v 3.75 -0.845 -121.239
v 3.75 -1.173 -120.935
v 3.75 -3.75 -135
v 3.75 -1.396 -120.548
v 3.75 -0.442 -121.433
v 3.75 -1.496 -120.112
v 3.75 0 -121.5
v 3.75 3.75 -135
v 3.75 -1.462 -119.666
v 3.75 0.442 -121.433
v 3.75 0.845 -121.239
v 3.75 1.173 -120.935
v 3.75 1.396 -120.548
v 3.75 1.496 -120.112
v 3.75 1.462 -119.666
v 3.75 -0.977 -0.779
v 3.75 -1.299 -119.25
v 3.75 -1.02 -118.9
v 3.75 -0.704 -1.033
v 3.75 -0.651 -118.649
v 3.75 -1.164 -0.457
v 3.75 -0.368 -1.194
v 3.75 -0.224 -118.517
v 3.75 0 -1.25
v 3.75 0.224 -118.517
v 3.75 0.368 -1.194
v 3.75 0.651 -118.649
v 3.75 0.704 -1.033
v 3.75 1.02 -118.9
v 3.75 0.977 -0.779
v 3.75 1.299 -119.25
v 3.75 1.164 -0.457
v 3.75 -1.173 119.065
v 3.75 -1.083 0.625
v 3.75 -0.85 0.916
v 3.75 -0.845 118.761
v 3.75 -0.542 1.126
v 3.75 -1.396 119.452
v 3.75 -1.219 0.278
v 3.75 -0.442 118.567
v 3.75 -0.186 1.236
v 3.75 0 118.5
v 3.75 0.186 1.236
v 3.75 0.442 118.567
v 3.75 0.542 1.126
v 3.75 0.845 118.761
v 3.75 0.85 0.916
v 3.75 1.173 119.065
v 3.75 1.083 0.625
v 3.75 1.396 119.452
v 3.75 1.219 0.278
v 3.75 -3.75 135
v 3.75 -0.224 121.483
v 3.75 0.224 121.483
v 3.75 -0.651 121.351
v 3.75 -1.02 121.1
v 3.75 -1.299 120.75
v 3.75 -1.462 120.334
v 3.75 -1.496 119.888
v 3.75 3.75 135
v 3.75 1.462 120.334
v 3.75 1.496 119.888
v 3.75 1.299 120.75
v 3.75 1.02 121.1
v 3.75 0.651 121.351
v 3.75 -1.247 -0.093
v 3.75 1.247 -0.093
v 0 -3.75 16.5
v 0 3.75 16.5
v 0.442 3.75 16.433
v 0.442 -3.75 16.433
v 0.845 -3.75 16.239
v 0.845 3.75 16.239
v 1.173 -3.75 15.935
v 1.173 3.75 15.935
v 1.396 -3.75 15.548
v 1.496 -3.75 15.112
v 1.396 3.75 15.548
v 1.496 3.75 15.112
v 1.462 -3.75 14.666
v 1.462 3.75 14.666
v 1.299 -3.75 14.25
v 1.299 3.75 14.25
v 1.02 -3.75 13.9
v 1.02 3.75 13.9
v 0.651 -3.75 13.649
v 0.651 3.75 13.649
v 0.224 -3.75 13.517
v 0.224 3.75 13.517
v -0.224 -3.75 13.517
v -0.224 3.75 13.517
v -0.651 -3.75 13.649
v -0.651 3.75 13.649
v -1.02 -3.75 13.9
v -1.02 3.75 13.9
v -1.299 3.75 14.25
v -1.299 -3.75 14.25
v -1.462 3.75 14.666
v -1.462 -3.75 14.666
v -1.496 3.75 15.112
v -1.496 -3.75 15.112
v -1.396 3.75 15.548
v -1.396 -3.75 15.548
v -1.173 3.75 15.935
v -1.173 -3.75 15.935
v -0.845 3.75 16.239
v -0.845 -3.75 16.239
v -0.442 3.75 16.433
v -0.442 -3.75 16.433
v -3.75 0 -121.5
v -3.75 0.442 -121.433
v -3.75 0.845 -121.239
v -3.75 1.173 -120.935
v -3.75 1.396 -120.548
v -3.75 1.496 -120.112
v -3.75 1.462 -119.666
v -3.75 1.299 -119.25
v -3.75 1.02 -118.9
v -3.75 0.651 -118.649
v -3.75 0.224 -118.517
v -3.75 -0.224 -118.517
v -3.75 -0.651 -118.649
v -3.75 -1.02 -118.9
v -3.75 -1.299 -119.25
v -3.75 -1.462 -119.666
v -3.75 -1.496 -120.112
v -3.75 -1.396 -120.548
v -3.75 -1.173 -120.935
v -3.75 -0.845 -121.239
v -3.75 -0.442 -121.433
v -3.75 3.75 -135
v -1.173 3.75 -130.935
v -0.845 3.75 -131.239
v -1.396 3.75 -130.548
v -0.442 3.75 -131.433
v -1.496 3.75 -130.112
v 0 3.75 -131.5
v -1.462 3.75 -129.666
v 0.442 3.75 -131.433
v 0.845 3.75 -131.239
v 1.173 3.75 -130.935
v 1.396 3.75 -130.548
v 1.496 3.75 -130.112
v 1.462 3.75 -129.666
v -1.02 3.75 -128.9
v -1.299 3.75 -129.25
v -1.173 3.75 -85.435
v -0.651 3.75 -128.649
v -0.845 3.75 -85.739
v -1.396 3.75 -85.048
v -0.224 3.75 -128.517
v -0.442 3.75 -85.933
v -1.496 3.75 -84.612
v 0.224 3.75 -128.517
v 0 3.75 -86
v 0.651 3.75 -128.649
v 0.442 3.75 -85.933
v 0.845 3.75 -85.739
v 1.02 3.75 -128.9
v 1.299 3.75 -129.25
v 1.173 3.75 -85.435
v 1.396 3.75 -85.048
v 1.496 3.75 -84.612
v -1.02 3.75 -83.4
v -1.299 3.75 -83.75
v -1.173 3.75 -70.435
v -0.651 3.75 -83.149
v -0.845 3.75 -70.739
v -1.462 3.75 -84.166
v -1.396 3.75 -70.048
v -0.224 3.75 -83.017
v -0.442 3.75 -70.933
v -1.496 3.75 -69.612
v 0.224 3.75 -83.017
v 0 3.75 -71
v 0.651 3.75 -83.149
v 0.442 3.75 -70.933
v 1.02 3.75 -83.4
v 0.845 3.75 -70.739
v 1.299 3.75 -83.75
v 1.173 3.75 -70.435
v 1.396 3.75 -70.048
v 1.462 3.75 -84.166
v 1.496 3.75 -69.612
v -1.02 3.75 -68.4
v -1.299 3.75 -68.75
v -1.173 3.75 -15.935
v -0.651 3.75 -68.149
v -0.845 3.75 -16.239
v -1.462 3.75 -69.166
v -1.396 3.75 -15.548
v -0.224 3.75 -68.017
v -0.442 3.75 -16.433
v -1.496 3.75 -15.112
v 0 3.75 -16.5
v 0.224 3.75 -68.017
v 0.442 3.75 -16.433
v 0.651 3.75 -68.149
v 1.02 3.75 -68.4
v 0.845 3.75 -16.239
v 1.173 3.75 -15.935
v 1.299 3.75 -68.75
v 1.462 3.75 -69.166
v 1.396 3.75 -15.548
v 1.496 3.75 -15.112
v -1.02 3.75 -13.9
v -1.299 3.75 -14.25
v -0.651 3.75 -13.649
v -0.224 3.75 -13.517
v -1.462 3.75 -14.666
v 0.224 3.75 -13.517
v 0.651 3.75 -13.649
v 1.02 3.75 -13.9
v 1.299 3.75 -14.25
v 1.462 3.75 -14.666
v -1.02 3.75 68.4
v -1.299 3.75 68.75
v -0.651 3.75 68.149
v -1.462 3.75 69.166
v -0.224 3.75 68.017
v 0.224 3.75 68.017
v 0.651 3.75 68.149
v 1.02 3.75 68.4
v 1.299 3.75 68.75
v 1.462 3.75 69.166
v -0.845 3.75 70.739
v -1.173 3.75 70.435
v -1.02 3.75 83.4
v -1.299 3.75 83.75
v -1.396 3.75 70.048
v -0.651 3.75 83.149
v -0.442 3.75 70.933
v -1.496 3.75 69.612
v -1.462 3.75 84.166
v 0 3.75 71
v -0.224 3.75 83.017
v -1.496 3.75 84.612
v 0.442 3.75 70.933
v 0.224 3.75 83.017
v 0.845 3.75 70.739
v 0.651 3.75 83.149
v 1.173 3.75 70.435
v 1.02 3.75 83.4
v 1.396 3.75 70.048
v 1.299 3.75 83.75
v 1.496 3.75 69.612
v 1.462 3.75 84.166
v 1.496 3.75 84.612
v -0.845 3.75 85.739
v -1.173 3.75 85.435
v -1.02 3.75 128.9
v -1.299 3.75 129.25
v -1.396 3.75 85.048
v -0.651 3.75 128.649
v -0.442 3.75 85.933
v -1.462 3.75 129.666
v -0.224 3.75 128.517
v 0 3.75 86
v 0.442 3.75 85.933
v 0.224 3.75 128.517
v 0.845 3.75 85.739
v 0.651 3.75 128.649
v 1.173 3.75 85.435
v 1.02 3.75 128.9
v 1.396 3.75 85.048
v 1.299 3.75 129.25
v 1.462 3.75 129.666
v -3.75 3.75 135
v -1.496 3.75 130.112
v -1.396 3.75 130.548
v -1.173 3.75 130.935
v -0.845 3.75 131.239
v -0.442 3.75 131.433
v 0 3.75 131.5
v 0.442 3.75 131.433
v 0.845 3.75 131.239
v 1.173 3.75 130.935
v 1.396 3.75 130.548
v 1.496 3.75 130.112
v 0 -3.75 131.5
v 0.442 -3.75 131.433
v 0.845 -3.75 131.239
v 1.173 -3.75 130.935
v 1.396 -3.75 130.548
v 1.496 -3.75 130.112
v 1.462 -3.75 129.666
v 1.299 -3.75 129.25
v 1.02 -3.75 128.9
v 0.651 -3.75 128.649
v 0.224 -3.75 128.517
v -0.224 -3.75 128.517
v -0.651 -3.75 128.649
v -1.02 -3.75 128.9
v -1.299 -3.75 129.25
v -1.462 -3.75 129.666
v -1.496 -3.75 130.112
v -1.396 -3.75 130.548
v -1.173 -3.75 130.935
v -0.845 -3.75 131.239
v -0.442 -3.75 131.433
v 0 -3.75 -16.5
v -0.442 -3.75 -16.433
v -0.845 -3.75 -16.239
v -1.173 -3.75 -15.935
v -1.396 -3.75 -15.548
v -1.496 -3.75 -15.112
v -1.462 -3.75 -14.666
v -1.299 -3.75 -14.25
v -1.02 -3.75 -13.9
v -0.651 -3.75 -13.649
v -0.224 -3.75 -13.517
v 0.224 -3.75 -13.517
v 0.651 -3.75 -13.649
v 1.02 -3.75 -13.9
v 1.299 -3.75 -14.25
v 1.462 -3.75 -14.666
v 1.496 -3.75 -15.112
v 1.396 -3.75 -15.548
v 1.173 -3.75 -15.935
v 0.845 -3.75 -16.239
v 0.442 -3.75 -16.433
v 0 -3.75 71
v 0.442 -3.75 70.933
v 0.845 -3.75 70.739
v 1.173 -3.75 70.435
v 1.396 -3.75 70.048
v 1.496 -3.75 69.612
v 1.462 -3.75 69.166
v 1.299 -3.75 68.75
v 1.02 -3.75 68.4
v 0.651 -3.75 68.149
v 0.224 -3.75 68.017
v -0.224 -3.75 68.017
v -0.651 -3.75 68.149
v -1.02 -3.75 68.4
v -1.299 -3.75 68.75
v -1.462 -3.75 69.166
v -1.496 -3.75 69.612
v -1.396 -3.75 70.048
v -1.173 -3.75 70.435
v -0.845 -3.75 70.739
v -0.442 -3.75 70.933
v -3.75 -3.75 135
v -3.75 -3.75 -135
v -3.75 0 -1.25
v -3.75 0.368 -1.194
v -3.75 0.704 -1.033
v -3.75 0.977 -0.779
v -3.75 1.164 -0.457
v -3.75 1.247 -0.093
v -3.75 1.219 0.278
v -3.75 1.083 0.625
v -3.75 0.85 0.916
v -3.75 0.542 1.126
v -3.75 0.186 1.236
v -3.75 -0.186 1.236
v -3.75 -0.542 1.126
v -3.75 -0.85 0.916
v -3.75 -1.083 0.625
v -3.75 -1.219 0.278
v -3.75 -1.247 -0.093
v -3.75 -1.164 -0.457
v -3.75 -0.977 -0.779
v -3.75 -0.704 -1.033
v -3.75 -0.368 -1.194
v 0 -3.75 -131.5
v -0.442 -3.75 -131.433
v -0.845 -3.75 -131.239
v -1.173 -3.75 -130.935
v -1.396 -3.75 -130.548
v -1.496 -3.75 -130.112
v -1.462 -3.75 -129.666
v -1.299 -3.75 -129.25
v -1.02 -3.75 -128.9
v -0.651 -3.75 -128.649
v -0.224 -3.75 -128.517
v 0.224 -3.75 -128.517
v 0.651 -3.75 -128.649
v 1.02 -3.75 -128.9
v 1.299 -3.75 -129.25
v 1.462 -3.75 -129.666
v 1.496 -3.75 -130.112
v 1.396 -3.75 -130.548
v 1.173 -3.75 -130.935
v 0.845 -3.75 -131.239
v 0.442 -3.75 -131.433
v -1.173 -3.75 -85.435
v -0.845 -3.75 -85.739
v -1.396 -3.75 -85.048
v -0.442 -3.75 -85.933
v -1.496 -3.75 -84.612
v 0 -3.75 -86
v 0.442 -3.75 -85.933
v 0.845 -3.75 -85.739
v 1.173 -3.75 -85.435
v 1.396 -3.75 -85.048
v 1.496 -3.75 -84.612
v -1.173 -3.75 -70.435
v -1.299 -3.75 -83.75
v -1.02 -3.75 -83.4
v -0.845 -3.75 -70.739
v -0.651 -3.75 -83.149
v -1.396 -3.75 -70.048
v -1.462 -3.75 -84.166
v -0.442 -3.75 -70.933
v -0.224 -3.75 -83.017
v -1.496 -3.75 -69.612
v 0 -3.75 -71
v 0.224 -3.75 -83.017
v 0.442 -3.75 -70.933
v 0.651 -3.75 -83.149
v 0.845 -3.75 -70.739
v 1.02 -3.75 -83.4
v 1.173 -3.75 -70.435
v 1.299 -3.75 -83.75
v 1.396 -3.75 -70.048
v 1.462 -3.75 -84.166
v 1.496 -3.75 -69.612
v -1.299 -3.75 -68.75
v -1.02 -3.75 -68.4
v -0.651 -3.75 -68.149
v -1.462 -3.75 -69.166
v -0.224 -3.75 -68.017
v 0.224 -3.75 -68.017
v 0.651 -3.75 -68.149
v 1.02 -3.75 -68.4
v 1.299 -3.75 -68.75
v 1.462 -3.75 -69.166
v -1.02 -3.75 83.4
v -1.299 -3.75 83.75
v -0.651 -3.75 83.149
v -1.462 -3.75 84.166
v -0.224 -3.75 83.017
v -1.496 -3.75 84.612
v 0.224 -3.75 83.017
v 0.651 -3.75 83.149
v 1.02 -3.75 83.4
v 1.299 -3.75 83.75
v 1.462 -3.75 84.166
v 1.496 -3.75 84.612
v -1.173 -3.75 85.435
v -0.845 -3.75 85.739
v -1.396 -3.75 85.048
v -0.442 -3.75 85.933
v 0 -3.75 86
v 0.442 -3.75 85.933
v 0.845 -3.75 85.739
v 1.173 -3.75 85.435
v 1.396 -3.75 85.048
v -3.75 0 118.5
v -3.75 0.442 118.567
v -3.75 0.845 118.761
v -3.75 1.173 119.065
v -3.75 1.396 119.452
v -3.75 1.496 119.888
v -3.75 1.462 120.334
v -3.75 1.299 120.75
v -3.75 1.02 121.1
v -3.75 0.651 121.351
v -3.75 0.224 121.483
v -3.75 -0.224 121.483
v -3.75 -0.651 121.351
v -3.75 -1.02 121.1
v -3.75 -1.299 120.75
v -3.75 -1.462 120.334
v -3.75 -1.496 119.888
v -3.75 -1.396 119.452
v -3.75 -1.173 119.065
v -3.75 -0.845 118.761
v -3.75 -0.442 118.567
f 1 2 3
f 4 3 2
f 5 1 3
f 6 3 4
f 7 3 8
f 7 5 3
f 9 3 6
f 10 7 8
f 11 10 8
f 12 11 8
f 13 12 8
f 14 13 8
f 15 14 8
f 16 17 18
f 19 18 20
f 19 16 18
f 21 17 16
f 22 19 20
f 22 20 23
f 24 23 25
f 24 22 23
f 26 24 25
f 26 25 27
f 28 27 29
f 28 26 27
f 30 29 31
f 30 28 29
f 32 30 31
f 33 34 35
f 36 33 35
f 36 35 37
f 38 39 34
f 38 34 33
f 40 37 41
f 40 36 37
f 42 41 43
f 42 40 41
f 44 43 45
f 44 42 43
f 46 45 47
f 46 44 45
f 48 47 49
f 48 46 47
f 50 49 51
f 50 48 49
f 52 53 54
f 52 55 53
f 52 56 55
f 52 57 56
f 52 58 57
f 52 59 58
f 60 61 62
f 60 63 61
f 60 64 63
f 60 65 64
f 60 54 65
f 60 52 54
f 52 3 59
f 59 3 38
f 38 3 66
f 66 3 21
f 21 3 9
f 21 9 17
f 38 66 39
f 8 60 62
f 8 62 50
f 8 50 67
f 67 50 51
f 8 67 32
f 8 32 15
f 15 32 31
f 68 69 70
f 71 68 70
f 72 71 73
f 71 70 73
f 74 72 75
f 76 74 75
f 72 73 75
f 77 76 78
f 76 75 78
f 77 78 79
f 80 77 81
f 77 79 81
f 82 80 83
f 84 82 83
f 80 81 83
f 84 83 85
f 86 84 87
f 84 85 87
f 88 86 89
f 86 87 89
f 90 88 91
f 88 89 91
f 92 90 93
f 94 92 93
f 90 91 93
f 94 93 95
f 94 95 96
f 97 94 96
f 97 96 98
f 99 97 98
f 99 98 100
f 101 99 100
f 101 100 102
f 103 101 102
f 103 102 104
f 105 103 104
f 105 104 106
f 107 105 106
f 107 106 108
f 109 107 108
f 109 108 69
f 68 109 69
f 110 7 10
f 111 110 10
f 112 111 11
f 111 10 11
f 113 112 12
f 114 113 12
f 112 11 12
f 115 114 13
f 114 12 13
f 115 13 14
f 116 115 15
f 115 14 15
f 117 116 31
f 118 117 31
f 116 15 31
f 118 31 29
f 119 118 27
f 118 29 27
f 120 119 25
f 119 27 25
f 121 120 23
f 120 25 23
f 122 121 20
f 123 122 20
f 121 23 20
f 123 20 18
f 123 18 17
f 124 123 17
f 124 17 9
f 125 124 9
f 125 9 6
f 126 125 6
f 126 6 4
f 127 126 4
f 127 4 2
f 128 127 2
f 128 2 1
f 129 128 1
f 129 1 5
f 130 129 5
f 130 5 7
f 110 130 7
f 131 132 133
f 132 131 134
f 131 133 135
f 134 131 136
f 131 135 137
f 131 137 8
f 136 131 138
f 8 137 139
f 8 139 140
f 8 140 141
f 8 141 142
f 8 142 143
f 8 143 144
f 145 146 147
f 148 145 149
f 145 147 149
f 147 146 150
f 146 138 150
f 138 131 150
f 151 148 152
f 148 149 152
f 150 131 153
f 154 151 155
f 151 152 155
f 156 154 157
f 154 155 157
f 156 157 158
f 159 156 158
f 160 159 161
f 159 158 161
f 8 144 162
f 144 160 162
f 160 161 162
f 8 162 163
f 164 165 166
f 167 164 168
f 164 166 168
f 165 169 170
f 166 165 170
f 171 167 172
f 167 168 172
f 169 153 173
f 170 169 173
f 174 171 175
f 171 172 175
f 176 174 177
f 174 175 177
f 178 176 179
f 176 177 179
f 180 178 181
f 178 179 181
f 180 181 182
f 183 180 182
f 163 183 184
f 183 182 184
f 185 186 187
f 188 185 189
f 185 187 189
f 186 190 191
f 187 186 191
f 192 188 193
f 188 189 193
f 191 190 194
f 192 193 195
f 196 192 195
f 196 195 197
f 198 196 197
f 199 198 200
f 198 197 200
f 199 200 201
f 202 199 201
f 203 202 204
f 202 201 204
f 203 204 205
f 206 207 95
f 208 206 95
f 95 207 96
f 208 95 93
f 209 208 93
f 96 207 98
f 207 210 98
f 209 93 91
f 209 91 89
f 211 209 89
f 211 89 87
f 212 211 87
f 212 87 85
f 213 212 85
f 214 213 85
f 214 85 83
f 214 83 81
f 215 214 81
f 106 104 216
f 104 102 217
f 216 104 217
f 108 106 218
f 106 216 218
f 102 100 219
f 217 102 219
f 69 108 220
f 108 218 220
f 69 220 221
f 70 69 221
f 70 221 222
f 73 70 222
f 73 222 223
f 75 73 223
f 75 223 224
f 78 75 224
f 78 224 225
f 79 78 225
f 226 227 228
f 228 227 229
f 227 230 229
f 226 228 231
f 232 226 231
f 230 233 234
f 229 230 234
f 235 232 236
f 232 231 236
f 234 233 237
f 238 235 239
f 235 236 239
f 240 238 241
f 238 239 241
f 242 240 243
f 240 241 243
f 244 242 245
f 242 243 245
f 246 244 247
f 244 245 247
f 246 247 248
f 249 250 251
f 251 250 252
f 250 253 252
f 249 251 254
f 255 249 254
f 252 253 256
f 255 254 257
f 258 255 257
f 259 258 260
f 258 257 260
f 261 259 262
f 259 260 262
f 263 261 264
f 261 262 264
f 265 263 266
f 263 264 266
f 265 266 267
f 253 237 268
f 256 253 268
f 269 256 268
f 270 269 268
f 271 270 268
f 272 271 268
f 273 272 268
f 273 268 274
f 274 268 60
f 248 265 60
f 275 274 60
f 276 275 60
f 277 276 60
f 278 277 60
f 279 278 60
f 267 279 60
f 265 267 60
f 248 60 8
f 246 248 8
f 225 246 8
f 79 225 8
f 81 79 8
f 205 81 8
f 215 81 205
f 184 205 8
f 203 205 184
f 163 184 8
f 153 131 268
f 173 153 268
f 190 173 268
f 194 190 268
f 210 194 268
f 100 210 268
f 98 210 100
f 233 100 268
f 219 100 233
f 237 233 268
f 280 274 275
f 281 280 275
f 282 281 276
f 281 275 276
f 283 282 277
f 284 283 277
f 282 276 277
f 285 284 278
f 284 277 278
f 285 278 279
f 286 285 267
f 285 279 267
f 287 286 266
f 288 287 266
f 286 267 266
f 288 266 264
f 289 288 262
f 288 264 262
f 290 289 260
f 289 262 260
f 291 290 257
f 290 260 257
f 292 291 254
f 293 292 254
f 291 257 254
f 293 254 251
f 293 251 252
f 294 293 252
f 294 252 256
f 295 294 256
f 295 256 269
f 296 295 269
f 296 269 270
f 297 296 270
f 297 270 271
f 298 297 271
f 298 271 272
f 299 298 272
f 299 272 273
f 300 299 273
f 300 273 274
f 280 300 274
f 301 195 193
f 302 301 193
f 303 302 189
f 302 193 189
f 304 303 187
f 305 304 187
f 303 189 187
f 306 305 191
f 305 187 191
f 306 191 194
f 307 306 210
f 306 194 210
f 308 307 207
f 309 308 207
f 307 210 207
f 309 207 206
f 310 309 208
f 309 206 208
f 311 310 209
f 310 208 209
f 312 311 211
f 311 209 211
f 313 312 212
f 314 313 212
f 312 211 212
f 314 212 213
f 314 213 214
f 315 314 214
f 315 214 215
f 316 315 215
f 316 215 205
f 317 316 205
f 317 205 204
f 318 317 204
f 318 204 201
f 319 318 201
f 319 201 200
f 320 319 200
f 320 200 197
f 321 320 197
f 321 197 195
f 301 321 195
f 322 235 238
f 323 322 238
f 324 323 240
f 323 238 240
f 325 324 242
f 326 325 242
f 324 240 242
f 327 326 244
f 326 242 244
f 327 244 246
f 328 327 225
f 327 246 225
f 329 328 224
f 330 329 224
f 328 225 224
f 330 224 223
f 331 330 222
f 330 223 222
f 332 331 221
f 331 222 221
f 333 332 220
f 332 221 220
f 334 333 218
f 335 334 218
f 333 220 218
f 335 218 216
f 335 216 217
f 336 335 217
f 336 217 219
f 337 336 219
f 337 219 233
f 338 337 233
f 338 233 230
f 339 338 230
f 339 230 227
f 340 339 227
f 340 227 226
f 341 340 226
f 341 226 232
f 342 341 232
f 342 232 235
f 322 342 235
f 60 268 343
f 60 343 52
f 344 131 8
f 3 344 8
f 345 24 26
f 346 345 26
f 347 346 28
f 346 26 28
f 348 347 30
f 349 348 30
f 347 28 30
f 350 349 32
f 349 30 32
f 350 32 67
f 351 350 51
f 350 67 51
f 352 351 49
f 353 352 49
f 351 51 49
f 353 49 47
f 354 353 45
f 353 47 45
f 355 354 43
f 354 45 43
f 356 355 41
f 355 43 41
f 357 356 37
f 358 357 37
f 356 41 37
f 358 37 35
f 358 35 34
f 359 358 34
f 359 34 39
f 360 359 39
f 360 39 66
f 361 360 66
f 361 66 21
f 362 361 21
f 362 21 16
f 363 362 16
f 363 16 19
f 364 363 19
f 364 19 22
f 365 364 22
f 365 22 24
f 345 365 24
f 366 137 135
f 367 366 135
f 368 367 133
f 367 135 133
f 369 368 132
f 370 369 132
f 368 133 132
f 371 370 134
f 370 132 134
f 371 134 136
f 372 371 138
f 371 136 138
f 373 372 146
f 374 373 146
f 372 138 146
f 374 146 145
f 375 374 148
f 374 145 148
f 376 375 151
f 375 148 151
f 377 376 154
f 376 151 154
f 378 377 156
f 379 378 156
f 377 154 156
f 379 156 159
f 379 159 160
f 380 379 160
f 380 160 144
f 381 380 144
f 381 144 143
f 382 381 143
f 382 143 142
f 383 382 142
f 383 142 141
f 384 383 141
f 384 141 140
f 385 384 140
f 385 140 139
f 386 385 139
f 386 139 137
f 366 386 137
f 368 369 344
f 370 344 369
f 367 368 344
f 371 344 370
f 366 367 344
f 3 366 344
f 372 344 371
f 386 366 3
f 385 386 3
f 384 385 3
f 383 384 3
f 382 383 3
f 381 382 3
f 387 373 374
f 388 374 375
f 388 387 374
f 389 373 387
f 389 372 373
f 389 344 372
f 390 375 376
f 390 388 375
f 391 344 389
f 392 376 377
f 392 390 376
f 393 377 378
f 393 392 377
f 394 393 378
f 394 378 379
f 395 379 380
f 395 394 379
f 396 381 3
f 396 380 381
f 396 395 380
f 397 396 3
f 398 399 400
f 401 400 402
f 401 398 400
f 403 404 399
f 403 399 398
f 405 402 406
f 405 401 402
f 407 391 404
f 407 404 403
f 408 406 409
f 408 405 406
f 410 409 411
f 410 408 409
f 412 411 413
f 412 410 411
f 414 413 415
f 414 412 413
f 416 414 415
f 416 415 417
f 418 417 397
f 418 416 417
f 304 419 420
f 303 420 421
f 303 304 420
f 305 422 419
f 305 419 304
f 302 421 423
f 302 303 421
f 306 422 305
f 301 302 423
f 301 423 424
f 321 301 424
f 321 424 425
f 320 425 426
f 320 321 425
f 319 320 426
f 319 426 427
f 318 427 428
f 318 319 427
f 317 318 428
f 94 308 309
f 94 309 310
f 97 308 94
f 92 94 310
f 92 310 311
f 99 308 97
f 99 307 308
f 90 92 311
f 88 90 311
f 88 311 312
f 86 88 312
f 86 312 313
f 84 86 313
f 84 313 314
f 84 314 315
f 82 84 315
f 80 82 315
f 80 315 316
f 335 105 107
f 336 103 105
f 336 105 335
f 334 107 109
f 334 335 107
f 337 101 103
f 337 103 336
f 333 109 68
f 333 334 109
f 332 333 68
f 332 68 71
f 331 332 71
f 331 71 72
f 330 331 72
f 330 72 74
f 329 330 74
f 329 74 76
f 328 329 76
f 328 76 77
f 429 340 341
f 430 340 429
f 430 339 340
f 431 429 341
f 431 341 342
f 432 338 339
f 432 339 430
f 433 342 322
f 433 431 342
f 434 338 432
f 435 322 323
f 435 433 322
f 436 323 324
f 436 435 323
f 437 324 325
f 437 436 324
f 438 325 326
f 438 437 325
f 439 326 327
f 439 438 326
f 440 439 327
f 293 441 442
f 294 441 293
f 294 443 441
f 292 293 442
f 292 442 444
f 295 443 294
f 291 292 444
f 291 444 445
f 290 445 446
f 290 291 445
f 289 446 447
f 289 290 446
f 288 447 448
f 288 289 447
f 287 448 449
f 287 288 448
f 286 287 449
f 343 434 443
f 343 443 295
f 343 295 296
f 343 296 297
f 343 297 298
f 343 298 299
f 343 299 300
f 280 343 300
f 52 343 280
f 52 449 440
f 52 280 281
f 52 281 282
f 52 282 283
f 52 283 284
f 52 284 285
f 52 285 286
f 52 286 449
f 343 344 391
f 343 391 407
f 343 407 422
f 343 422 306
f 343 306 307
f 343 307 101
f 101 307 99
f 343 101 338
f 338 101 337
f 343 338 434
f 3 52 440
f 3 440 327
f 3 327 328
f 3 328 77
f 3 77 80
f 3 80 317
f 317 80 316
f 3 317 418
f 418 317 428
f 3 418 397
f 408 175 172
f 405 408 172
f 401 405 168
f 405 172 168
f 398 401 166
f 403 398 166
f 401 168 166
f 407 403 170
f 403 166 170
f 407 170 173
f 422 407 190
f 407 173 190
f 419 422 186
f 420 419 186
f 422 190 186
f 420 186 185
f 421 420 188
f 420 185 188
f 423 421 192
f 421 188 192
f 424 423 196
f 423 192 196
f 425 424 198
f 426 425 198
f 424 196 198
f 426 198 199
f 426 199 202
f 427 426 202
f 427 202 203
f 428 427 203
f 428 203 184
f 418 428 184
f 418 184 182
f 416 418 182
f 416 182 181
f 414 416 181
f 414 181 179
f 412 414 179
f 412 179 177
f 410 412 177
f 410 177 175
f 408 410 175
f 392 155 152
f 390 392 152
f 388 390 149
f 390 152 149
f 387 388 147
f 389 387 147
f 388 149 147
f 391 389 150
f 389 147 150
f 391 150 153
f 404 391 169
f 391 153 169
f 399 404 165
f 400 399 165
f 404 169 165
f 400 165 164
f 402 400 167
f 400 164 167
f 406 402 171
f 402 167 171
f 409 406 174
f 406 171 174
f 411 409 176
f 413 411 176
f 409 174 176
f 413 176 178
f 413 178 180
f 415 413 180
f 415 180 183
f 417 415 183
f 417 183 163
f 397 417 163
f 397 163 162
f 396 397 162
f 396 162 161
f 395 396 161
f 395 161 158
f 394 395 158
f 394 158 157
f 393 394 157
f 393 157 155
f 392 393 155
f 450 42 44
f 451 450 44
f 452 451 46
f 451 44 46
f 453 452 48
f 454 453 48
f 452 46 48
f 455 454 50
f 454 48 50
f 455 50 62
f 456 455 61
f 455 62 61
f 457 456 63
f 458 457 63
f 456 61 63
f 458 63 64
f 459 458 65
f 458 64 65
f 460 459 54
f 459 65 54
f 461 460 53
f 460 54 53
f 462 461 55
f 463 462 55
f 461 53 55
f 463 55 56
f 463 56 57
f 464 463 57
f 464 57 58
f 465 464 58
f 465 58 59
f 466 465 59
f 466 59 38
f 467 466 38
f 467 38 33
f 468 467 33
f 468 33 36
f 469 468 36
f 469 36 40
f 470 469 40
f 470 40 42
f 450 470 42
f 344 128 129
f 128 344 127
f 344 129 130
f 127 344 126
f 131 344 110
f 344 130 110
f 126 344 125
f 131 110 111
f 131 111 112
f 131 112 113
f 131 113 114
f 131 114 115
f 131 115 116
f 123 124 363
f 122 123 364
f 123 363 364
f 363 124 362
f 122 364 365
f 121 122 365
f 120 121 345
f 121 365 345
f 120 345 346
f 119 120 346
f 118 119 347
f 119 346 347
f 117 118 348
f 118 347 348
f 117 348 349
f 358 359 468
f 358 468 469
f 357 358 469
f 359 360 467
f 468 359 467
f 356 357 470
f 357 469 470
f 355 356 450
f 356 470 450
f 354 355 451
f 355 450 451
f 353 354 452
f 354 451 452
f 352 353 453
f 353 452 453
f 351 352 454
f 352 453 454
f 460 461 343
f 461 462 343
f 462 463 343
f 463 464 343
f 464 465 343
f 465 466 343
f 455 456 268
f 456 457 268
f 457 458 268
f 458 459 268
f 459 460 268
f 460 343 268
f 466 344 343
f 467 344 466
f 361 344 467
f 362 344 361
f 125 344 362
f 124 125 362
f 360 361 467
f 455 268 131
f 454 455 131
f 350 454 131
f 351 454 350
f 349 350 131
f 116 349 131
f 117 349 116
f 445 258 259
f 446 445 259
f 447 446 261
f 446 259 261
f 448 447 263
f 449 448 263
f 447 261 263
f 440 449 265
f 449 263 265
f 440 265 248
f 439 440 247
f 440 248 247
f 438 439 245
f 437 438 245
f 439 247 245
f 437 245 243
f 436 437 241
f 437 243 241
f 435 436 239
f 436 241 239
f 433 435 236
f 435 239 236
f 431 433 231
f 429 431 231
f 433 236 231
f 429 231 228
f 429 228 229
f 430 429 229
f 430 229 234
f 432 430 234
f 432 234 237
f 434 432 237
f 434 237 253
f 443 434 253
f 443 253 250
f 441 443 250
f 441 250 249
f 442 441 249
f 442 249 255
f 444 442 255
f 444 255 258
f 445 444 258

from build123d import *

# Parameters (mm, degrees)
ESQUISSE1_W             = 7.5
ESQUISSE1_H             = 7.5
BOSS_EXTRU_1_DEPTH      = 135
ESQUISSE2_R             = 1.5
ESQUISSE2_R_2           = 1.25
ENL_V_MAT_EXTRU_1_DEPTH = 136.260165977
ESQUISSE3_R             = 1.5
ENL_V_MAT_EXTRU_2_DEPTH = 136.260165977


with BuildPart() as part:
    # Esquisse1 → Boss.-Extru.1 (new, symmetric)
    with BuildSketch(Plane.XY):
        Rectangle(ESQUISSE1_W, ESQUISSE1_H)
    extrude(amount=BOSS_EXTRU_1_DEPTH, both=True)

    # Esquisse2 → Enlèv. mat.-Extru.1 (cut, through all)
    with BuildSketch(Plane(origin=(3.75, 0, 0), x_dir=(0, 0, -1), z_dir=(1, 0, 0))):
        with Locations((-120, 0)):
            Circle(ESQUISSE2_R)
        with Locations((120, 0)):
            Circle(ESQUISSE2_R)
        Circle(ESQUISSE2_R_2)
    extrude(amount=-ENL_V_MAT_EXTRU_1_DEPTH, mode=Mode.SUBTRACT)

    # Esquisse3 → Enlèv. mat.-Extru.2 (cut, through all)
    with BuildSketch(Plane(origin=(0, 3.75, 0), x_dir=(1, 0, 0), z_dir=(0, 1, 0))):
        with Locations(Location((0, -69.5, 0), (0, 0, 270))):
            Circle(ESQUISSE3_R)
        with Locations(Location((0, -84.5, 0), (0, 0, 270))):
            Circle(ESQUISSE3_R)
        with Locations(Location((0, 84.5, 0), (0, 0, 90))):
            Circle(ESQUISSE3_R)
        with Locations(Location((0, 69.5, 0), (0, 0, 90))):
            Circle(ESQUISSE3_R)
        with Locations(Location((0, -130, 0), (0, 0, 270))):
            Circle(ESQUISSE3_R)
        with Locations(Location((0, 130, 0), (0, 0, 90))):
            Circle(ESQUISSE3_R)
        with Locations(Location((0, -15, 0), (0, 0, 270))):
            Circle(ESQUISSE3_R)
        with Locations(Location((0, 15, 0), (0, 0, 90))):
            Circle(ESQUISSE3_R)
    extrude(amount=-ENL_V_MAT_EXTRU_2_DEPTH, mode=Mode.SUBTRACT)


solid = part.part
